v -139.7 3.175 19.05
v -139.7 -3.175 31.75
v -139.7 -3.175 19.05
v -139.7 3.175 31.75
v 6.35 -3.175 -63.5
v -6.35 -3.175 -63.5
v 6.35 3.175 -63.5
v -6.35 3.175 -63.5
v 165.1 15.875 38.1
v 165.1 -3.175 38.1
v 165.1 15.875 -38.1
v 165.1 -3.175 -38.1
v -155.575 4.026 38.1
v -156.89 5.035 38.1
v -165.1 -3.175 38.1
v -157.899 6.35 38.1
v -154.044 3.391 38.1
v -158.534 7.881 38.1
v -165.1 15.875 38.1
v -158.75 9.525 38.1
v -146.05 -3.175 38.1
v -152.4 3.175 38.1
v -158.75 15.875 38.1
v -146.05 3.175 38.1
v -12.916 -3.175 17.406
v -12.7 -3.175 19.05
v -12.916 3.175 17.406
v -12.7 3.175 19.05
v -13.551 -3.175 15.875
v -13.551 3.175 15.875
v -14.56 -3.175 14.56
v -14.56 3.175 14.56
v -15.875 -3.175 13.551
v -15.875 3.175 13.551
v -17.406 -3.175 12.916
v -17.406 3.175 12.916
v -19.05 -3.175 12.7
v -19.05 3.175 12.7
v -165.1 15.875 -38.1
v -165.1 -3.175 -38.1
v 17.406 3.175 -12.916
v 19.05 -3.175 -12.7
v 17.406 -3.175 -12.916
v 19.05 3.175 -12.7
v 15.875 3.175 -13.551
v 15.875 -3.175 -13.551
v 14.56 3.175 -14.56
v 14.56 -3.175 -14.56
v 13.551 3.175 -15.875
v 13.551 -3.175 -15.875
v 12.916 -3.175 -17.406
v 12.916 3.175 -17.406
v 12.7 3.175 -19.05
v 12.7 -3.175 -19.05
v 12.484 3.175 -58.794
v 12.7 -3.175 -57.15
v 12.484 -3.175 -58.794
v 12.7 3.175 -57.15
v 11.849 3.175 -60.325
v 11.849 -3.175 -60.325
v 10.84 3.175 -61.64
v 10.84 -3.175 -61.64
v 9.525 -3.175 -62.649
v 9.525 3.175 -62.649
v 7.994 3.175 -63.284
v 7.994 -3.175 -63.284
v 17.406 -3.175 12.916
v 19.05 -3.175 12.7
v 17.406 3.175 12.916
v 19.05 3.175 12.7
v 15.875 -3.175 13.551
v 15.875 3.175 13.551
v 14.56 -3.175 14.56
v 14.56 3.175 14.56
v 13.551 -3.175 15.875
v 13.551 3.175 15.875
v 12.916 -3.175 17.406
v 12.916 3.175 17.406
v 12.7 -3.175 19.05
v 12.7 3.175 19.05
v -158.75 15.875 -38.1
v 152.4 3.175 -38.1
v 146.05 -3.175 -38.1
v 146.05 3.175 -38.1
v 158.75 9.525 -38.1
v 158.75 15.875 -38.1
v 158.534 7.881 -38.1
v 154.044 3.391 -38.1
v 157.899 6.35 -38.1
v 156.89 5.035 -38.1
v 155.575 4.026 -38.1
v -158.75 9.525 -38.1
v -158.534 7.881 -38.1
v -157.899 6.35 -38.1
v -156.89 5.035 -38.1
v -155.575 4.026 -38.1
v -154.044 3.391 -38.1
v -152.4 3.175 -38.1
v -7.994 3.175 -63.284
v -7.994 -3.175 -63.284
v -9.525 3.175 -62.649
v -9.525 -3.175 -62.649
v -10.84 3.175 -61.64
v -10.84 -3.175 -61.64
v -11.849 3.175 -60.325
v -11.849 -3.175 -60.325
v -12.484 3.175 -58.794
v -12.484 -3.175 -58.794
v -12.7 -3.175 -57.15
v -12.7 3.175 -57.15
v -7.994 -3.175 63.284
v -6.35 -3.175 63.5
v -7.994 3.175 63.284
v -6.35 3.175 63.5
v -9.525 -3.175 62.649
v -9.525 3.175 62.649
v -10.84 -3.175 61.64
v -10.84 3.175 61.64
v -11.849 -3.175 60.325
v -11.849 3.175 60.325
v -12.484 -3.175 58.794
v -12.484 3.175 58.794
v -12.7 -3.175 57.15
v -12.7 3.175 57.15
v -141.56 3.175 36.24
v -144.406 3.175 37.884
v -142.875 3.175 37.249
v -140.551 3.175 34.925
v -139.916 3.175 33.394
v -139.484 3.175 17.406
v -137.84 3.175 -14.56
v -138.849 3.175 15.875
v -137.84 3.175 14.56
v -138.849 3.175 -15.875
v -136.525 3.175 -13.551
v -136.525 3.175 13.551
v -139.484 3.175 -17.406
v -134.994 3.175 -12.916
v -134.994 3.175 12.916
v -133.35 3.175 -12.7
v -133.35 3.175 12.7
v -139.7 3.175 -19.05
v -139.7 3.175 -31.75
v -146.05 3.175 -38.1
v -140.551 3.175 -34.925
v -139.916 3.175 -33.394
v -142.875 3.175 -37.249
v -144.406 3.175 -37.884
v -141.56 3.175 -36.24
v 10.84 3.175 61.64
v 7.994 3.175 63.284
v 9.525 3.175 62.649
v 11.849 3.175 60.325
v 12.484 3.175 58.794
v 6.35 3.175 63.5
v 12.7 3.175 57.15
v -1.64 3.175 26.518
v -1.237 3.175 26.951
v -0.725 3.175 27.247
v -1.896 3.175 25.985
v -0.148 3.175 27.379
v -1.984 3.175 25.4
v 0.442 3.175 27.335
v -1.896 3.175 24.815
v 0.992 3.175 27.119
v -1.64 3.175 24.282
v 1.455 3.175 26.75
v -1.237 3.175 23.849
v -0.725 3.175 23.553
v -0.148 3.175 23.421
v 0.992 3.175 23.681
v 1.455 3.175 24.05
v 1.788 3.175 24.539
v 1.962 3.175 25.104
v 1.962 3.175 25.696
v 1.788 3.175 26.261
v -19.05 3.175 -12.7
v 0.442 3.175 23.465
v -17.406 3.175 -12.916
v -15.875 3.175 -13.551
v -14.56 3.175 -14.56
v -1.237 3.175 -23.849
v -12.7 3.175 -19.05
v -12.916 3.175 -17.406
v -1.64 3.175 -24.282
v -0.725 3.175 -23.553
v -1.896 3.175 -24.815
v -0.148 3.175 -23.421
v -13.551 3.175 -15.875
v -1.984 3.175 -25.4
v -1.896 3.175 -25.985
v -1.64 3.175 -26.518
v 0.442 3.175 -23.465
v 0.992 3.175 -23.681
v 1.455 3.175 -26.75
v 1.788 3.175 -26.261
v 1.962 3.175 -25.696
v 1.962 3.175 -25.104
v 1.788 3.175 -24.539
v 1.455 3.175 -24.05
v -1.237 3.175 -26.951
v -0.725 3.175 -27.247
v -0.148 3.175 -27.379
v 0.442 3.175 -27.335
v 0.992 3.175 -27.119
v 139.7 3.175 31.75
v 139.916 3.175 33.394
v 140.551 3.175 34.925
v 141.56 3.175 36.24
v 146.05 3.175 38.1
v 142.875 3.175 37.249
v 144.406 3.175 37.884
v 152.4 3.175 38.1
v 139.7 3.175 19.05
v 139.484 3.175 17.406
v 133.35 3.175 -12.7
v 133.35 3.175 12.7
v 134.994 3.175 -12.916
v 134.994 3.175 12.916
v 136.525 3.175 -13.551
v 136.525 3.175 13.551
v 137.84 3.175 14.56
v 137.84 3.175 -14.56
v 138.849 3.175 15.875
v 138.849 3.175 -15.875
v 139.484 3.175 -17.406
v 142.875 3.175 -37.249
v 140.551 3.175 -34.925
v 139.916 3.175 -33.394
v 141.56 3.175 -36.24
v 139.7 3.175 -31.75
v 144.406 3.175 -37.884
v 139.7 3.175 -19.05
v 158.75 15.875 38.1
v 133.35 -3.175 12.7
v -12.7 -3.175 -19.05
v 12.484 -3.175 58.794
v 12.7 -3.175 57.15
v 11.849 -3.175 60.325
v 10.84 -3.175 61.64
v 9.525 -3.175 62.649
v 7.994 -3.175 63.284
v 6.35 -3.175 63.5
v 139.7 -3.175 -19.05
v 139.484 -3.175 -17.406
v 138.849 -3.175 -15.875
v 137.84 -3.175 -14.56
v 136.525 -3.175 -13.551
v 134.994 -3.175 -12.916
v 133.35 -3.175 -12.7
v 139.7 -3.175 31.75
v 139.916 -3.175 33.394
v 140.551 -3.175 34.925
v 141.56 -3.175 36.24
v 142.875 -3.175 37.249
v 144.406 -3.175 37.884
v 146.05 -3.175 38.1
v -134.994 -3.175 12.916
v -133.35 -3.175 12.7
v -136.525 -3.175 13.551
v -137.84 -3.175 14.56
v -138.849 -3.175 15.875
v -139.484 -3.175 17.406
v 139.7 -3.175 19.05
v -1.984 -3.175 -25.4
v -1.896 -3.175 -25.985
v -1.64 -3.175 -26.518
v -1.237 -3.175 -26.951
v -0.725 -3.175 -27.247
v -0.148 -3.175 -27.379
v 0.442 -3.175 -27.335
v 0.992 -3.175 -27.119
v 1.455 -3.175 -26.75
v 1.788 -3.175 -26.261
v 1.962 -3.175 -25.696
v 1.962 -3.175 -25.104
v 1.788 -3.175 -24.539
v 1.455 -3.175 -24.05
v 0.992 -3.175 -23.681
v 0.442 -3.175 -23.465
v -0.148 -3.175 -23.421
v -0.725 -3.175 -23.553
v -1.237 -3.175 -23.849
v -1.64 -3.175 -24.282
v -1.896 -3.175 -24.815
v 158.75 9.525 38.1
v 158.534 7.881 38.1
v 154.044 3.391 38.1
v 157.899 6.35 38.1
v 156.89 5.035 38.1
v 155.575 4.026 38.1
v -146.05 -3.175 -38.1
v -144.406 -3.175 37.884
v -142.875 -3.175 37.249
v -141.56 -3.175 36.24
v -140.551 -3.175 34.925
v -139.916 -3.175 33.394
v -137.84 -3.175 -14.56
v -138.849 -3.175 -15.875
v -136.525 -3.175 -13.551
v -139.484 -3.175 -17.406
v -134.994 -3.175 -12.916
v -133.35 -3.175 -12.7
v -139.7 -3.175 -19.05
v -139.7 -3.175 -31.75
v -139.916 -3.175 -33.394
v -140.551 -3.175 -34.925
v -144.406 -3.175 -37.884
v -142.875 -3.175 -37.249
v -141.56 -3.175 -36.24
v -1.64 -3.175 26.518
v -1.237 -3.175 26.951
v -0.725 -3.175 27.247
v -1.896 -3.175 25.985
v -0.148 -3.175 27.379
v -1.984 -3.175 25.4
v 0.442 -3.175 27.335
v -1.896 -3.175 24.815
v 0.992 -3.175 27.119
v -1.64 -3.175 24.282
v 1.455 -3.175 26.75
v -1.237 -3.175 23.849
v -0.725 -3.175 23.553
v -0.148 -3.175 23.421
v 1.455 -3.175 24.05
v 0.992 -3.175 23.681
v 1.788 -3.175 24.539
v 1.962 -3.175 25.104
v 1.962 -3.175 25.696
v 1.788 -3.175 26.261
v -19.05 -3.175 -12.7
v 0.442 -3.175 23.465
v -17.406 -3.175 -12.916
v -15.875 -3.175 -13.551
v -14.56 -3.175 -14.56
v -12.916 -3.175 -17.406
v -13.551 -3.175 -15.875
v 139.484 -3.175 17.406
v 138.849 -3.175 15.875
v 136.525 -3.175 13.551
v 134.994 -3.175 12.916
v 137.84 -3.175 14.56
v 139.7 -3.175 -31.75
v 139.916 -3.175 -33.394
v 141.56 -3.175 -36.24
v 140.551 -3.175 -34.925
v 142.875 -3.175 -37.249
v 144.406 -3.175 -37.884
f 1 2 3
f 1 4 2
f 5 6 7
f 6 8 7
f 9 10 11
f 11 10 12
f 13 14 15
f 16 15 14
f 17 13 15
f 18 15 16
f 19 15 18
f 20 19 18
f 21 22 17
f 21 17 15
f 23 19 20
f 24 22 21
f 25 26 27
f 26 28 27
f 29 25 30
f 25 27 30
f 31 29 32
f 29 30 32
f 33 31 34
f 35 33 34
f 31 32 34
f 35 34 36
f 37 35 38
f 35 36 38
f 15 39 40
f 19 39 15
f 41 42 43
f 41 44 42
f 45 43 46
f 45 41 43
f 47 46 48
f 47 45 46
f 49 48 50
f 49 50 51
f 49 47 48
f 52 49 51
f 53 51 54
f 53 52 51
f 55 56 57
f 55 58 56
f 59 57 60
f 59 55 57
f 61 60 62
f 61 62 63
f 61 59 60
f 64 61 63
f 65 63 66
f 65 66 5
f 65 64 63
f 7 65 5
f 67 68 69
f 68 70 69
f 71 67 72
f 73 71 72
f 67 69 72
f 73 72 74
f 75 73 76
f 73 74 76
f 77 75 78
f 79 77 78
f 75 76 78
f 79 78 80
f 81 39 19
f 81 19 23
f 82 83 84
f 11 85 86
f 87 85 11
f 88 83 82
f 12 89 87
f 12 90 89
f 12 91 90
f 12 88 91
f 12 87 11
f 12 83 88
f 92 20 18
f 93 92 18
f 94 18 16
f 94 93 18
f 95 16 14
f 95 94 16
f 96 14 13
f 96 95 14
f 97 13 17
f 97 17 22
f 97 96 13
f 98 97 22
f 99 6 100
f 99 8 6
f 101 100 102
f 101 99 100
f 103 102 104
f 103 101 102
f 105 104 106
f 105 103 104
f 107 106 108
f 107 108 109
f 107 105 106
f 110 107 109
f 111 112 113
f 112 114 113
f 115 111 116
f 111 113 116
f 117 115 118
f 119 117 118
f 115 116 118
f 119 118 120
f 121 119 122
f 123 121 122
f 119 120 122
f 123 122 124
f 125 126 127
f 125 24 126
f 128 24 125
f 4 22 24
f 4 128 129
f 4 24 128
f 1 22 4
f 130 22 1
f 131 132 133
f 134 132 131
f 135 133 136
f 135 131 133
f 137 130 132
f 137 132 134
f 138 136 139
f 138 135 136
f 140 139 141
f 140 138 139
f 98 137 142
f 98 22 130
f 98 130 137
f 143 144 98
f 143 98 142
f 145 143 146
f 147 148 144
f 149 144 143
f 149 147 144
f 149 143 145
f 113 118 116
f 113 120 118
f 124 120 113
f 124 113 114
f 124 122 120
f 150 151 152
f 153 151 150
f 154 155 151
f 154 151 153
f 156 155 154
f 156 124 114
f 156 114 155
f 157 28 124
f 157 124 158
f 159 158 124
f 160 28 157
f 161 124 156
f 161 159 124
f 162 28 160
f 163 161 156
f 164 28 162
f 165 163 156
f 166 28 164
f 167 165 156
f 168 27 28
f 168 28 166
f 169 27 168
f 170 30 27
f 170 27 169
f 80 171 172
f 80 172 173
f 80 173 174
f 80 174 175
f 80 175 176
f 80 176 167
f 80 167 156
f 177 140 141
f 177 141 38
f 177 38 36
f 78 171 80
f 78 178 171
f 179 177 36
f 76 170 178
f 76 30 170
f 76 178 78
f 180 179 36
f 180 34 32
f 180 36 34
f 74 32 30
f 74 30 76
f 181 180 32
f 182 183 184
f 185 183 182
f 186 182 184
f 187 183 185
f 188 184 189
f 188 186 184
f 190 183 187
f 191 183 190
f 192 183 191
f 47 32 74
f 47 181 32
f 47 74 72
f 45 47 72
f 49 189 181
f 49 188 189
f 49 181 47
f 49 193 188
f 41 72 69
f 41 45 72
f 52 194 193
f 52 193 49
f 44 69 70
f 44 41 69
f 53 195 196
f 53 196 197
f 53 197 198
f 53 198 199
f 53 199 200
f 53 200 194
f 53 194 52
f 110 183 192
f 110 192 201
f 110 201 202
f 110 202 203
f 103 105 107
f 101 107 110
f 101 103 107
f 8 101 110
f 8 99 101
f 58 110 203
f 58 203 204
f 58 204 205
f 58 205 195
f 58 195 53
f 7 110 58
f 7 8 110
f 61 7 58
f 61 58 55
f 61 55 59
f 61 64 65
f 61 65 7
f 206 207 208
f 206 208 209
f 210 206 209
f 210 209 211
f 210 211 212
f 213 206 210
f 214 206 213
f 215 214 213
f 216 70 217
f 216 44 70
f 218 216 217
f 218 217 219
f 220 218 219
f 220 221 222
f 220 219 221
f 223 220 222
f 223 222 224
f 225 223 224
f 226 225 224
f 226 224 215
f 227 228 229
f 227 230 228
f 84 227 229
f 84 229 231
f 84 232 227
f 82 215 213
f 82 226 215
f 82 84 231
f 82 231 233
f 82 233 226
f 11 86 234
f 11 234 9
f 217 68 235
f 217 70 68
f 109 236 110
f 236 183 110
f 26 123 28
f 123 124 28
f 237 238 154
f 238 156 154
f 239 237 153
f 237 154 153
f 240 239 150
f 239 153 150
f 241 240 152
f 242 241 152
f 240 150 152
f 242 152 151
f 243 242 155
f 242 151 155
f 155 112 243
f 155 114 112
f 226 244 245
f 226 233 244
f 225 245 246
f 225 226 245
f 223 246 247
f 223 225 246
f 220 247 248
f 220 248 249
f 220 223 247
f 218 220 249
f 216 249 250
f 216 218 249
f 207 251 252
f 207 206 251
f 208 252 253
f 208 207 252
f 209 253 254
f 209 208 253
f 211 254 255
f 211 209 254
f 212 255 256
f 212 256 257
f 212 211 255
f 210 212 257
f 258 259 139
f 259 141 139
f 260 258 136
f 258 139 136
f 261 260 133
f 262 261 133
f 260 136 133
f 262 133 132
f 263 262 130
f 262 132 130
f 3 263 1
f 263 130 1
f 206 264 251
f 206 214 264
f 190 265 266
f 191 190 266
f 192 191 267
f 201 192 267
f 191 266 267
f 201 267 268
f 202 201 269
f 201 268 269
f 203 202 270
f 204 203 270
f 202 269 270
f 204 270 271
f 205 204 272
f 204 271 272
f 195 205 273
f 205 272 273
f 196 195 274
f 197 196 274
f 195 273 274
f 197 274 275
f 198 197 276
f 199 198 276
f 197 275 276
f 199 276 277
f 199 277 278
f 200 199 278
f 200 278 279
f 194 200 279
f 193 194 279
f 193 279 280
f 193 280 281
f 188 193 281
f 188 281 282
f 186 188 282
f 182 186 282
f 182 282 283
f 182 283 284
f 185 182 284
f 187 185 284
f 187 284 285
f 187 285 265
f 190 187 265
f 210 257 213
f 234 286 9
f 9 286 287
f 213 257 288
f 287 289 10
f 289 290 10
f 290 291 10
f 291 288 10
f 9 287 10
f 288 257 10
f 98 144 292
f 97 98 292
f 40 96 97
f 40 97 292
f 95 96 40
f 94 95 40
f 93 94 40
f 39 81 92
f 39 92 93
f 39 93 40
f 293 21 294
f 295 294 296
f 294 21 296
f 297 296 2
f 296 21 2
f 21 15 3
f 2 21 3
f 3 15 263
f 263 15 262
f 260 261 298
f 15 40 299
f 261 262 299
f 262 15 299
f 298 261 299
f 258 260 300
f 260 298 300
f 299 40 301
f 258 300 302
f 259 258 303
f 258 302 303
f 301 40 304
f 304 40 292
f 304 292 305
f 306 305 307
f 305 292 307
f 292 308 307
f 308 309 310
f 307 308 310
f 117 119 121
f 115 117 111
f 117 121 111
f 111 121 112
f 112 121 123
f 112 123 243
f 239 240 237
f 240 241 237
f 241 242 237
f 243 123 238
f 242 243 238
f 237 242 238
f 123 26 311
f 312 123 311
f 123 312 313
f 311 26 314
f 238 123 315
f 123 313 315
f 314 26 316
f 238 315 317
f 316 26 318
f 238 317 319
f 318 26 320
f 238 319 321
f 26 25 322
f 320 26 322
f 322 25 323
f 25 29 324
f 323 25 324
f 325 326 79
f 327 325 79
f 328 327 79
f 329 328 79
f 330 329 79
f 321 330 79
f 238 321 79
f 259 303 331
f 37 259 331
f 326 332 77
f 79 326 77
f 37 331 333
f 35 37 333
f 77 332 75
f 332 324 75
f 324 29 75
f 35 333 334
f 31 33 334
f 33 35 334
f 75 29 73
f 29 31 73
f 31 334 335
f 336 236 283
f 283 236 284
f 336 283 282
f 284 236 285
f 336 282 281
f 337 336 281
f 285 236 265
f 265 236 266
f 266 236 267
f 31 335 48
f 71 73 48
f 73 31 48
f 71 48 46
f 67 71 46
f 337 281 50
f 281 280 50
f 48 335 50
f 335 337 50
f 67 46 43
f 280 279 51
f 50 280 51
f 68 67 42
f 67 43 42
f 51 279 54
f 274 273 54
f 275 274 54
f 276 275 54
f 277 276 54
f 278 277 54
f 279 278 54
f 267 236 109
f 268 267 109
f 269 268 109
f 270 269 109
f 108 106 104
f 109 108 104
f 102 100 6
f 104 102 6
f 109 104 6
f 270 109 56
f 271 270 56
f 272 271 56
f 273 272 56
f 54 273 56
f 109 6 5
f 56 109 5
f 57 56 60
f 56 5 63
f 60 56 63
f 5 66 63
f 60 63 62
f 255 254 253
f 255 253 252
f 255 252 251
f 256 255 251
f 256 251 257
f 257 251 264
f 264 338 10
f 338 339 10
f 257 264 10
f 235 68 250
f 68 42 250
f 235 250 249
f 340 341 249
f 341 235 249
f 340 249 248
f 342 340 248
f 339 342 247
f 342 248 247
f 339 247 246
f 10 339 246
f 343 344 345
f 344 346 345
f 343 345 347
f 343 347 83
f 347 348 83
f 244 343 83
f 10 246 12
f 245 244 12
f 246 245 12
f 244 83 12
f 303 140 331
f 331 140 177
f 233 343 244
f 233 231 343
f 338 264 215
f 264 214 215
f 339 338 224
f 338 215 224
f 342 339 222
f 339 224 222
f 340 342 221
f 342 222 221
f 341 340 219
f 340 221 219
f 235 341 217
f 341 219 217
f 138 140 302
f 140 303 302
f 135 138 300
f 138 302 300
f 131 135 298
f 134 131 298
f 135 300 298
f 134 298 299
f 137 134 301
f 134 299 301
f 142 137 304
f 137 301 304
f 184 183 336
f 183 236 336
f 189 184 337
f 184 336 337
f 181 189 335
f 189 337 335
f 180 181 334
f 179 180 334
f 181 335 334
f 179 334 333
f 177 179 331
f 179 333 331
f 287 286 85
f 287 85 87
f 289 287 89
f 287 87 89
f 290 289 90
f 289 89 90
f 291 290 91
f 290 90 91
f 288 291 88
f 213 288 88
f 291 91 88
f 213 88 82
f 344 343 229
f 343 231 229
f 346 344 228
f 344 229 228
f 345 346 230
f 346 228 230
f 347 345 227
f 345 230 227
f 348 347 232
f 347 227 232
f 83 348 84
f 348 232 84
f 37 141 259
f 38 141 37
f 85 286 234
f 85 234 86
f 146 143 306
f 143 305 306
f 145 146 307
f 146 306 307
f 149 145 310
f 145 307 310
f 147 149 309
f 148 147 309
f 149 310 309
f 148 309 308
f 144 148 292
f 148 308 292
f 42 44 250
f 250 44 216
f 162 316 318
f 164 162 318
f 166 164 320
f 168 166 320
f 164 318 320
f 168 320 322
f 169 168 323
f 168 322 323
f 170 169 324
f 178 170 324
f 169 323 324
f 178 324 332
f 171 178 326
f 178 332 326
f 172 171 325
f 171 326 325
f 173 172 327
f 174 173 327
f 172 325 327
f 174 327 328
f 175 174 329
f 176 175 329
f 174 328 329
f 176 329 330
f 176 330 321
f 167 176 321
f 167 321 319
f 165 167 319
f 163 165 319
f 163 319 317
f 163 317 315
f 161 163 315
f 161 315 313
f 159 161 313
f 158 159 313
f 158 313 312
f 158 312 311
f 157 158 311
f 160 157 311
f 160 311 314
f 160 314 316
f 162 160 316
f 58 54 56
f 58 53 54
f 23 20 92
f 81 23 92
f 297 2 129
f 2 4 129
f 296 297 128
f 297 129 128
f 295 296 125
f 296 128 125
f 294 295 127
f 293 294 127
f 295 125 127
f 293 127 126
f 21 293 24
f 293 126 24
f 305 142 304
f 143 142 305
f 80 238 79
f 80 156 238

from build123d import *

# Parameters (mm, degrees)
SKETCH1_W                       = 127
SKETCH1_H                       = 25.4
SKETCH1_W_2                     = 25.4
SKETCH1_H_2                     = 50.8
BOSS_EXTRUDE1_DEPTH             = 3.175
F_5_32_0_15625_DIAMETER_HOLE1_D = 3.96875
SKETCH4_W                       = 6.35
SKETCH4_H                       = 76.2
BOSS_EXTRUDE2_DEPTH             = 12.7
FILLET2_R                       = 6.35


with BuildPart() as part:
    # Sketch1 → Boss-Extrude1 (new, symmetric)
    with BuildSketch(Plane(origin=(0, 0, 0), x_dir=(1, 0, 0), z_dir=(0, 1, 0))):
        Polygon((-139.7, -12.7), (-139.7, 12.7), (-139.7, 38.1), (-165.1, 38.1), (-165.1, -38.1), (-139.7, -38.1), align=None)
        with Locations((-76.2, 0)):
            Rectangle(SKETCH1_W, SKETCH1_H)
        with Locations((0, 38.1)):
            Rectangle(SKETCH1_W_2, SKETCH1_H_2)
        with Locations((76.2, 0)):
            Rectangle(SKETCH1_W, SKETCH1_H)
        Rectangle(SKETCH1_W_2, SKETCH1_H)
        with Locations((0, -38.1)):
            Rectangle(SKETCH1_W_2, SKETCH1_H_2)
        Polygon((139.7, 38.1), (139.7, 12.7), (139.7, -12.7), (139.7, -38.1), (165.1, -38.1), (165.1, 38.1), align=None)
    extrude(amount=BOSS_EXTRUDE1_DEPTH, both=True)

    # 5/32 (0.15625) Diameter Hole1 (through all)
    with Locations(Plane(origin=(0, 3.175, 0), x_dir=(1, 0, 0), z_dir=(0, 1, 0))):
        with Locations((0, 25.4), (0, -25.4)):
            Hole(F_5_32_0_15625_DIAMETER_HOLE1_D / 2)

    # Sketch4 → Boss-Extrude2 (add)
    with BuildSketch(Plane(origin=(0, 3.175, 0), x_dir=(1, 0, 0), z_dir=(0, 1, 0))):
        with Locations((161.925, 0)):
            Rectangle(SKETCH4_W, SKETCH4_H)
        with Locations((-161.925, 0)):
            Rectangle(SKETCH4_W, SKETCH4_H)
    extrude(amount=BOSS_EXTRUDE2_DEPTH)

    # Fillet2
    fillet2_edges = [part.edges().sort_by_distance(p)[0] for p in [
        (-139.7, 0, -12.7),
        (-12.7, 0, -12.7),
        (-12.7, 0, -63.5),
        (12.7, 0, -63.5),
        (12.7, 0, -12.7),
        (139.7, 0, -12.7),
        (139.7, 0, -38.1),
        (139.7, 0, 38.1),
        (139.7, 0, 12.7),
        (12.7, 0, 12.7),
        (12.7, 0, 63.5),
        (-12.7, 0, 63.5),
        (-12.7, 0, 12.7),
        (-139.7, 0, 12.7),
        (-139.7, 0, 38.1),
        (-139.7, 0, -38.1),
        (158.75, 3.175, 0),
        (-158.75, 3.175, 0),
    ]]
    fillet(fillet2_edges, radius=FILLET2_R)


solid = part.part
